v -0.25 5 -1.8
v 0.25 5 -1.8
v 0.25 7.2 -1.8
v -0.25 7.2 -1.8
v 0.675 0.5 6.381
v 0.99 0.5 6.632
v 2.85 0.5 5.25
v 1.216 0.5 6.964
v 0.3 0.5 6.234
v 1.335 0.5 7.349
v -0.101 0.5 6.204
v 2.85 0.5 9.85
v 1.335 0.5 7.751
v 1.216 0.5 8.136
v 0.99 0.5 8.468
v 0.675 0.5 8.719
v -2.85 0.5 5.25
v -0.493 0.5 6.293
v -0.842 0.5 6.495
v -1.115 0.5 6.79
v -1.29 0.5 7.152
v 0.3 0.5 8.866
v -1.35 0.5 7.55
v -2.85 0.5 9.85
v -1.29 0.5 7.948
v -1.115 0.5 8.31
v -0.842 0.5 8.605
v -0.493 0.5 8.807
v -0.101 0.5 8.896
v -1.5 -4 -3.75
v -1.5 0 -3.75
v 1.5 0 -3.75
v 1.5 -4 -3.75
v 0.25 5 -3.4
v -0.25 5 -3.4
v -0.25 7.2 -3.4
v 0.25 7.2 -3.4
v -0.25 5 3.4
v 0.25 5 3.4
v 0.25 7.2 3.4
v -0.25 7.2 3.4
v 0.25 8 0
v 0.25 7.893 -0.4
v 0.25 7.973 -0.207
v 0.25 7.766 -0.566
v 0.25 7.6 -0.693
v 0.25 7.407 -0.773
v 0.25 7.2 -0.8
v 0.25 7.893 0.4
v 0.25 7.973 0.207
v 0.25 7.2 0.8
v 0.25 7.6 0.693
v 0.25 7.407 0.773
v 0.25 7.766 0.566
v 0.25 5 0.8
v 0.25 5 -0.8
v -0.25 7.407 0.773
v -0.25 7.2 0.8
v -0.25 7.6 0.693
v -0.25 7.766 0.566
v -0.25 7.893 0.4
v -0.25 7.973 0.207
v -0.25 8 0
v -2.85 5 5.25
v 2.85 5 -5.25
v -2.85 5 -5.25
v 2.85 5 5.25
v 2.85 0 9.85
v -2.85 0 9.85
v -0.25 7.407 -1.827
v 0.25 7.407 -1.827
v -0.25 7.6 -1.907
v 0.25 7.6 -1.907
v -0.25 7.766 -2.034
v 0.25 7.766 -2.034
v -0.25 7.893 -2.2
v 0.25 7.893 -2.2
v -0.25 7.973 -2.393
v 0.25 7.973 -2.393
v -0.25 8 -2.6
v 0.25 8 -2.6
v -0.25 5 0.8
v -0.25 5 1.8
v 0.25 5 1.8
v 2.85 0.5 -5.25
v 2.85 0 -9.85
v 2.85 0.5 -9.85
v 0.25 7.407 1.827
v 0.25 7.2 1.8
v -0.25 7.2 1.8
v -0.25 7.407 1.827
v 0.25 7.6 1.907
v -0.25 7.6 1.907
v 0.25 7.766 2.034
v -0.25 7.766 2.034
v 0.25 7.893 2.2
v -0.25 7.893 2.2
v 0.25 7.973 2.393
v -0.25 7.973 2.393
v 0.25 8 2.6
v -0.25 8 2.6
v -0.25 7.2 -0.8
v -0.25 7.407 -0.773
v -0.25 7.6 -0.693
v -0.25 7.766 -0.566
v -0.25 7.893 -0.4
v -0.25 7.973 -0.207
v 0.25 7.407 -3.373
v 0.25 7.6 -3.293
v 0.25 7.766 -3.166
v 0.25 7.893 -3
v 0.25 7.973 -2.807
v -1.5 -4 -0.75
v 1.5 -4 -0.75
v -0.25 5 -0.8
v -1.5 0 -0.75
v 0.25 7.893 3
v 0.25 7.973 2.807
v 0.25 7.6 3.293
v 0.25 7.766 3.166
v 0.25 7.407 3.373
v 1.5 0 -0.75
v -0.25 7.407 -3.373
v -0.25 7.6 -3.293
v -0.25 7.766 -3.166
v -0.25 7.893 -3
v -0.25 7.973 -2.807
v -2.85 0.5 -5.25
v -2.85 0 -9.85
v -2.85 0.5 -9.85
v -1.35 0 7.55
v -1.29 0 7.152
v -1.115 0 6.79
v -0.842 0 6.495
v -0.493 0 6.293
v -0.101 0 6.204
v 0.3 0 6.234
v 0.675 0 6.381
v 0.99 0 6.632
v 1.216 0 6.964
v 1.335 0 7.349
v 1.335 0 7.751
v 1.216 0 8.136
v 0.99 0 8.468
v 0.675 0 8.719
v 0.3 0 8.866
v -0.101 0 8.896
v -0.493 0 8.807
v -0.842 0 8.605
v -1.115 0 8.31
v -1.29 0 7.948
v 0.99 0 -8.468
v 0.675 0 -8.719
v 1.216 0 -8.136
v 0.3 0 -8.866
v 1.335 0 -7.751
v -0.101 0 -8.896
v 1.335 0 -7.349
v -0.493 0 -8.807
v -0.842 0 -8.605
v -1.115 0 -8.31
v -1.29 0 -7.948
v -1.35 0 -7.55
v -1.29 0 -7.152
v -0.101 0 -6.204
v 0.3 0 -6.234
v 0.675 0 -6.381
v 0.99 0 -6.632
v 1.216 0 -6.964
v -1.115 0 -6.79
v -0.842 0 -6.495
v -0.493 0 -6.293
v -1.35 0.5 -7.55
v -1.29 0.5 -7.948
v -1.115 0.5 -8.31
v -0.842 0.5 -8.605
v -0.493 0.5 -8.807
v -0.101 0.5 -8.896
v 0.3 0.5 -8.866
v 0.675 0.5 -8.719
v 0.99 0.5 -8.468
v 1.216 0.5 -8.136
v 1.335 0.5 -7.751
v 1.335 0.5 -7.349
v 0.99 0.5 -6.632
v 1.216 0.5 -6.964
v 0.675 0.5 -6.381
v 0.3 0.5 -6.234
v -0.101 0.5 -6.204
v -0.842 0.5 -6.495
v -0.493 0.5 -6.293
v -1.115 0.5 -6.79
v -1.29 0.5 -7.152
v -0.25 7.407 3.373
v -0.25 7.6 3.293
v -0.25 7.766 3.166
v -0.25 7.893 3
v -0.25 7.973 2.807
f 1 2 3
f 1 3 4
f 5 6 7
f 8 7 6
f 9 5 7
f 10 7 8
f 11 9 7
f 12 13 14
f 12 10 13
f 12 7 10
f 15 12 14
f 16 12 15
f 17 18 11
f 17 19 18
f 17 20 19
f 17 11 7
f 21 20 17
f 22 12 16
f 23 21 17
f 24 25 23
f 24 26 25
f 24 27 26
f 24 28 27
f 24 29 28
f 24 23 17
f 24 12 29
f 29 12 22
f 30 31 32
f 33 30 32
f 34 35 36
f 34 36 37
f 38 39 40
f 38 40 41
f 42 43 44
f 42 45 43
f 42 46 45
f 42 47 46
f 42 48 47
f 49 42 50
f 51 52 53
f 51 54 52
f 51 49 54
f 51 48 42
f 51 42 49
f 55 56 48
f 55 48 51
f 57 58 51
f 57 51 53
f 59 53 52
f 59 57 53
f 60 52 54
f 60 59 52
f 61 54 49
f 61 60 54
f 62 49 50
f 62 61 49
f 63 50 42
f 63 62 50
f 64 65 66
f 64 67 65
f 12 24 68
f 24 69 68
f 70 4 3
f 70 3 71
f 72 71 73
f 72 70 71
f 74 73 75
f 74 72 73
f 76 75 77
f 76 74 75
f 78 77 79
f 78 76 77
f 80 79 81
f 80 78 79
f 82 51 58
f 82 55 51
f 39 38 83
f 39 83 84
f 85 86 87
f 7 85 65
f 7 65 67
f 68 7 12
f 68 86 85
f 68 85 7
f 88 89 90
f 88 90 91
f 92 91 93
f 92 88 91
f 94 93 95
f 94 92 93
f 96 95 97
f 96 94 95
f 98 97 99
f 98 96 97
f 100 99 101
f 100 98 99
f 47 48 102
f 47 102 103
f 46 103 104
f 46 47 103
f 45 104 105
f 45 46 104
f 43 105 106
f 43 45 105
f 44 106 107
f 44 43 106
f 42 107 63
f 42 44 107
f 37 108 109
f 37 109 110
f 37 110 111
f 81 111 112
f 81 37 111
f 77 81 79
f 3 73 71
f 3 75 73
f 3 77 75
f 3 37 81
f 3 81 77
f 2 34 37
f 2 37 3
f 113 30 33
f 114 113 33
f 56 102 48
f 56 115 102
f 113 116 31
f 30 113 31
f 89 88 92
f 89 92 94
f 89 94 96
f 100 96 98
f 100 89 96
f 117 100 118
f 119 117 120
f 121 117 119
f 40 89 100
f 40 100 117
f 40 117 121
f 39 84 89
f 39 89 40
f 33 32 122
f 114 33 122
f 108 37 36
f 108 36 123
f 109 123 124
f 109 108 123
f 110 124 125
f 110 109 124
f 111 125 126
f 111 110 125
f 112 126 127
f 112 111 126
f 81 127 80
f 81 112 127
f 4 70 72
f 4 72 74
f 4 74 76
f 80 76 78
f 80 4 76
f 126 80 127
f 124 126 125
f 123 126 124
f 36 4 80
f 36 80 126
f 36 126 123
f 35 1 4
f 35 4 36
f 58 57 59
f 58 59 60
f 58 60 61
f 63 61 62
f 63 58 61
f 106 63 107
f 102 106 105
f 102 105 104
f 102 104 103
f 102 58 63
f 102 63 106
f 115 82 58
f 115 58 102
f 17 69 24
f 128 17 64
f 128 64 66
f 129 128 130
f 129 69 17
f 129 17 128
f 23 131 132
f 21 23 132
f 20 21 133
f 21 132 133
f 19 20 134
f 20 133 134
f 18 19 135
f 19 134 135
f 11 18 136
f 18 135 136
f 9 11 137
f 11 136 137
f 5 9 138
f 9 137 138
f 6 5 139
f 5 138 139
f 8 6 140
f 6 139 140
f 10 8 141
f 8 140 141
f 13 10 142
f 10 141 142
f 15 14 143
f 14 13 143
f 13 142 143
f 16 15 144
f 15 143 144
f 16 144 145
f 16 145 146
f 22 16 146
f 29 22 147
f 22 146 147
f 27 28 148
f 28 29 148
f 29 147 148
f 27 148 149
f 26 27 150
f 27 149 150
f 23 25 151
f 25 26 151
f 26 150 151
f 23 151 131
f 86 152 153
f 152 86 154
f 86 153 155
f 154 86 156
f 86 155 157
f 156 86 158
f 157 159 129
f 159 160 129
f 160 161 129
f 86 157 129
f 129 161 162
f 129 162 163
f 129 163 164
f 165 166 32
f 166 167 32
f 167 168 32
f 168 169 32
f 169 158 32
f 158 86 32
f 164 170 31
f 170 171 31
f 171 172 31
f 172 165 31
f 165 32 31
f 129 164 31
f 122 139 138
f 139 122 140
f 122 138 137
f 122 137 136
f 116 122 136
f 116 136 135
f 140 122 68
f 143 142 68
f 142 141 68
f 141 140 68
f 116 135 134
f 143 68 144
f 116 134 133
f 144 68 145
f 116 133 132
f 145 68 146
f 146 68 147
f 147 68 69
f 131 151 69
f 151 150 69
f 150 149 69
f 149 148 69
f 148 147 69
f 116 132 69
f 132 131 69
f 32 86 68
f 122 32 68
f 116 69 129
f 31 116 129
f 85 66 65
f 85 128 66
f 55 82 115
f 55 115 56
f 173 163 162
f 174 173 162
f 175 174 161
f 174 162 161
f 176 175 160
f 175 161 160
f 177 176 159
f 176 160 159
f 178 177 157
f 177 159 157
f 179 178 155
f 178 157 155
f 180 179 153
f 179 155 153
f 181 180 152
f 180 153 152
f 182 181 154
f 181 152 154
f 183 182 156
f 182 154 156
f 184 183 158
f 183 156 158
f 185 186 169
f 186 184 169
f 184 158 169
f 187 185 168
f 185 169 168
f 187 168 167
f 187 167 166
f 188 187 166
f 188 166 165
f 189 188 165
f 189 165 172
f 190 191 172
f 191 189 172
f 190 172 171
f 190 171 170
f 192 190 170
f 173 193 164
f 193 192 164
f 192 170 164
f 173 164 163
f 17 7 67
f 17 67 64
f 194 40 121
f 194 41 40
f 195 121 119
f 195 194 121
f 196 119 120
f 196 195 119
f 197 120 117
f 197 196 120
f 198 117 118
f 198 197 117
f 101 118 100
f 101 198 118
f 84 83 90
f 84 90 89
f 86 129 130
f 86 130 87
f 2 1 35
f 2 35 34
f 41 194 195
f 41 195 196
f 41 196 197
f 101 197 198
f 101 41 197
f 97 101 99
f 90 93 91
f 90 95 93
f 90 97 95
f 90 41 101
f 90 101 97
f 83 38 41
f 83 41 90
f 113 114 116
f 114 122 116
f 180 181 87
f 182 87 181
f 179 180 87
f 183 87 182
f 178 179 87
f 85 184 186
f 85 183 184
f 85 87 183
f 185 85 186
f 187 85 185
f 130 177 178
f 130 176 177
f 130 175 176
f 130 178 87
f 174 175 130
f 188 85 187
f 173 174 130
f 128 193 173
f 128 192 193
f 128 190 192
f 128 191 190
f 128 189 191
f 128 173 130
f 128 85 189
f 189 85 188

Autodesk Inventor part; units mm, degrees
ref_plane "YZ Plane" through (0, 0, 0) normal (1, 0, 0) x (0, 1, 0)
ref_plane "XZ Plane" through (0, 0, 0) normal (0, 1, 0) x (-1, 0, 0)
ref_plane "XY Plane" through (0, 0, 0) normal (0, 0, 1) x (1, 0, 0)
sketch "Sketch1" plane through (0, 0, 0) normal (0, 1, 0) x (-1, 0, 0)
  line L0 (-2.85, 5.25) -> (2.85, 5.25)
  line L1 (2.85, 5.25) -> (2.85, -5.25)
  line L2 (2.85, -5.25) -> (-2.85, -5.25)
  line L3 (-2.85, -5.25) -> (-2.85, 5.25)
  line L4 (-2.85, 5.25) -> (2.85, -5.25) construction
  line L5 (2.85, 5.25) -> (-2.85, -5.25) construction
  line L6 (2.85, -5.25) -> (2.85, -9.85)
  line L7 (2.85, -9.85) -> (-2.85, -9.85)
  line L8 (-2.85, -9.85) -> (-2.85, -5.25)
  circle A0 centre (0, -7.55) radius 1.35
  line L9 (0, 0) -> (2.85, 0)
  line L10 (2.85, 5.25) -> (2.85, 9.85)
  line L11 (2.85, 9.85) -> (-2.85, 9.85)
  line L12 (-2.85, 9.85) -> (-2.85, 5.25)
  circle A1 centre (0, 7.55) radius 1.35
  point P0 (2.85, -7.55)
  point P1 (0, -9.85)
  point P2 (2.85, 7.55)
  point P3 (0, 9.85)
  dimension "d0" = 10.5
  dimension "d1" = 5.7
  dimension "d2" = 9.85
  dimension "d3" = 2.7
extrude "Extrusion1" add sketch "Sketch1" along normal blind 5 contours L0 L1 L2 L3
extrude "Extrusion2" add sketch "Sketch1" along normal blind 0.5 contours L12 L11 L10 L0 | L2 L6 L7 L8
sketch "Sketch2" plane through (0, 0, 0) normal (0, 1, 0) x (1, 0, 0)
  line L0 (1.5, 0.75) -> (-1.5, 0.75)
  line L1 (-1.5, 0.75) -> (-1.5, 3.75)
  line L2 (-1.5, 3.75) -> (1.5, 3.75)
  line L3 (1.5, 3.75) -> (1.5, 0.75)
  line L4 (1.5, 0.75) -> (-1.5, 3.75) construction
  line L5 (-1.5, 0.75) -> (1.5, 3.75) construction
  line L6 (2.85, 5.25) -> (-2.85, 5.25) projected
  point P0 (0, 0)
  point P1 (0, 2.25)
  dimension "d8" = 3
  dimension "d9" = 3
  dimension "d10" = 1.5
extrude "Extrusion3" add sketch "Sketch2" against normal blind 4
sketch "Sketch3" plane through (0, 5, 0) normal (0, -1, 0) x (1, 0, 0)
  line L0 (0.25, 3.4) -> (-0.25, 3.4)
  line L1 (-0.25, 3.4) -> (-0.25, 1.8)
  line L2 (-0.25, 1.8) -> (0.25, 1.8)
  line L3 (0.25, 1.8) -> (0.25, 3.4)
  line L4 (0.25, 3.4) -> (-0.25, 1.8) construction
  line L5 (-0.25, 3.4) -> (0.25, 1.8) construction
  line L6 (-2.85, 5.25) -> (2.85, 5.25) projected
  line L7 (0.25, 0.8) -> (-0.25, 0.8)
  line L8 (-0.25, 0.8) -> (-0.25, -0.8)
  line L9 (-0.25, -0.8) -> (0.25, -0.8)
  line L10 (0.25, -0.8) -> (0.25, 0.8)
  line L11 (0.25, -1.8) -> (-0.25, -1.8)
  line L12 (-0.25, -1.8) -> (-0.25, -3.4)
  line L13 (-0.25, -3.4) -> (0.25, -3.4)
  line L14 (0.25, -3.4) -> (0.25, -1.8)
  line L15 (0.25, 0.8) -> (-0.25, -0.8)
  line L16 (-0.25, 0.8) -> (0.25, -0.8)
  point P0 (0, 0)
  point P1 (0, 2.6)
  point P2 (0, 0)
  dimension "d13" = 1.6
  dimension "d14" = 0.5
  dimension "d18" = 1.6
  dimension "d19" = 0.5
  dimension "d20" = 1.6
  dimension "d21" = 0.5
  dimension "d22" = 1
  dimension "d23" = 1
extrude "Extrusion4" add sketch "Sketch3" against normal blind 3 separate body
full round fillet "Full Round Fillet1" bodies 2 first side at (0.0833, 6, 3.4) centre faces at (0.0833, 8, 2.3333) second side at (-0.0833, 6, 1.8)
full round fillet "Full Round Fillet2" bodies 2 first side at (0.0833, 6, 0.8) centre faces at (0.0833, 8, -0.2667) second side at (-0.0833, 6, -0.8)
full round fillet "Full Round Fillet3" bodies 2 first side at (0.0833, 6, -1.8) centre faces at (0.0833, 8, -2.8667) second side at (-0.0833, 6, -3.4)
properties part number "switch"
